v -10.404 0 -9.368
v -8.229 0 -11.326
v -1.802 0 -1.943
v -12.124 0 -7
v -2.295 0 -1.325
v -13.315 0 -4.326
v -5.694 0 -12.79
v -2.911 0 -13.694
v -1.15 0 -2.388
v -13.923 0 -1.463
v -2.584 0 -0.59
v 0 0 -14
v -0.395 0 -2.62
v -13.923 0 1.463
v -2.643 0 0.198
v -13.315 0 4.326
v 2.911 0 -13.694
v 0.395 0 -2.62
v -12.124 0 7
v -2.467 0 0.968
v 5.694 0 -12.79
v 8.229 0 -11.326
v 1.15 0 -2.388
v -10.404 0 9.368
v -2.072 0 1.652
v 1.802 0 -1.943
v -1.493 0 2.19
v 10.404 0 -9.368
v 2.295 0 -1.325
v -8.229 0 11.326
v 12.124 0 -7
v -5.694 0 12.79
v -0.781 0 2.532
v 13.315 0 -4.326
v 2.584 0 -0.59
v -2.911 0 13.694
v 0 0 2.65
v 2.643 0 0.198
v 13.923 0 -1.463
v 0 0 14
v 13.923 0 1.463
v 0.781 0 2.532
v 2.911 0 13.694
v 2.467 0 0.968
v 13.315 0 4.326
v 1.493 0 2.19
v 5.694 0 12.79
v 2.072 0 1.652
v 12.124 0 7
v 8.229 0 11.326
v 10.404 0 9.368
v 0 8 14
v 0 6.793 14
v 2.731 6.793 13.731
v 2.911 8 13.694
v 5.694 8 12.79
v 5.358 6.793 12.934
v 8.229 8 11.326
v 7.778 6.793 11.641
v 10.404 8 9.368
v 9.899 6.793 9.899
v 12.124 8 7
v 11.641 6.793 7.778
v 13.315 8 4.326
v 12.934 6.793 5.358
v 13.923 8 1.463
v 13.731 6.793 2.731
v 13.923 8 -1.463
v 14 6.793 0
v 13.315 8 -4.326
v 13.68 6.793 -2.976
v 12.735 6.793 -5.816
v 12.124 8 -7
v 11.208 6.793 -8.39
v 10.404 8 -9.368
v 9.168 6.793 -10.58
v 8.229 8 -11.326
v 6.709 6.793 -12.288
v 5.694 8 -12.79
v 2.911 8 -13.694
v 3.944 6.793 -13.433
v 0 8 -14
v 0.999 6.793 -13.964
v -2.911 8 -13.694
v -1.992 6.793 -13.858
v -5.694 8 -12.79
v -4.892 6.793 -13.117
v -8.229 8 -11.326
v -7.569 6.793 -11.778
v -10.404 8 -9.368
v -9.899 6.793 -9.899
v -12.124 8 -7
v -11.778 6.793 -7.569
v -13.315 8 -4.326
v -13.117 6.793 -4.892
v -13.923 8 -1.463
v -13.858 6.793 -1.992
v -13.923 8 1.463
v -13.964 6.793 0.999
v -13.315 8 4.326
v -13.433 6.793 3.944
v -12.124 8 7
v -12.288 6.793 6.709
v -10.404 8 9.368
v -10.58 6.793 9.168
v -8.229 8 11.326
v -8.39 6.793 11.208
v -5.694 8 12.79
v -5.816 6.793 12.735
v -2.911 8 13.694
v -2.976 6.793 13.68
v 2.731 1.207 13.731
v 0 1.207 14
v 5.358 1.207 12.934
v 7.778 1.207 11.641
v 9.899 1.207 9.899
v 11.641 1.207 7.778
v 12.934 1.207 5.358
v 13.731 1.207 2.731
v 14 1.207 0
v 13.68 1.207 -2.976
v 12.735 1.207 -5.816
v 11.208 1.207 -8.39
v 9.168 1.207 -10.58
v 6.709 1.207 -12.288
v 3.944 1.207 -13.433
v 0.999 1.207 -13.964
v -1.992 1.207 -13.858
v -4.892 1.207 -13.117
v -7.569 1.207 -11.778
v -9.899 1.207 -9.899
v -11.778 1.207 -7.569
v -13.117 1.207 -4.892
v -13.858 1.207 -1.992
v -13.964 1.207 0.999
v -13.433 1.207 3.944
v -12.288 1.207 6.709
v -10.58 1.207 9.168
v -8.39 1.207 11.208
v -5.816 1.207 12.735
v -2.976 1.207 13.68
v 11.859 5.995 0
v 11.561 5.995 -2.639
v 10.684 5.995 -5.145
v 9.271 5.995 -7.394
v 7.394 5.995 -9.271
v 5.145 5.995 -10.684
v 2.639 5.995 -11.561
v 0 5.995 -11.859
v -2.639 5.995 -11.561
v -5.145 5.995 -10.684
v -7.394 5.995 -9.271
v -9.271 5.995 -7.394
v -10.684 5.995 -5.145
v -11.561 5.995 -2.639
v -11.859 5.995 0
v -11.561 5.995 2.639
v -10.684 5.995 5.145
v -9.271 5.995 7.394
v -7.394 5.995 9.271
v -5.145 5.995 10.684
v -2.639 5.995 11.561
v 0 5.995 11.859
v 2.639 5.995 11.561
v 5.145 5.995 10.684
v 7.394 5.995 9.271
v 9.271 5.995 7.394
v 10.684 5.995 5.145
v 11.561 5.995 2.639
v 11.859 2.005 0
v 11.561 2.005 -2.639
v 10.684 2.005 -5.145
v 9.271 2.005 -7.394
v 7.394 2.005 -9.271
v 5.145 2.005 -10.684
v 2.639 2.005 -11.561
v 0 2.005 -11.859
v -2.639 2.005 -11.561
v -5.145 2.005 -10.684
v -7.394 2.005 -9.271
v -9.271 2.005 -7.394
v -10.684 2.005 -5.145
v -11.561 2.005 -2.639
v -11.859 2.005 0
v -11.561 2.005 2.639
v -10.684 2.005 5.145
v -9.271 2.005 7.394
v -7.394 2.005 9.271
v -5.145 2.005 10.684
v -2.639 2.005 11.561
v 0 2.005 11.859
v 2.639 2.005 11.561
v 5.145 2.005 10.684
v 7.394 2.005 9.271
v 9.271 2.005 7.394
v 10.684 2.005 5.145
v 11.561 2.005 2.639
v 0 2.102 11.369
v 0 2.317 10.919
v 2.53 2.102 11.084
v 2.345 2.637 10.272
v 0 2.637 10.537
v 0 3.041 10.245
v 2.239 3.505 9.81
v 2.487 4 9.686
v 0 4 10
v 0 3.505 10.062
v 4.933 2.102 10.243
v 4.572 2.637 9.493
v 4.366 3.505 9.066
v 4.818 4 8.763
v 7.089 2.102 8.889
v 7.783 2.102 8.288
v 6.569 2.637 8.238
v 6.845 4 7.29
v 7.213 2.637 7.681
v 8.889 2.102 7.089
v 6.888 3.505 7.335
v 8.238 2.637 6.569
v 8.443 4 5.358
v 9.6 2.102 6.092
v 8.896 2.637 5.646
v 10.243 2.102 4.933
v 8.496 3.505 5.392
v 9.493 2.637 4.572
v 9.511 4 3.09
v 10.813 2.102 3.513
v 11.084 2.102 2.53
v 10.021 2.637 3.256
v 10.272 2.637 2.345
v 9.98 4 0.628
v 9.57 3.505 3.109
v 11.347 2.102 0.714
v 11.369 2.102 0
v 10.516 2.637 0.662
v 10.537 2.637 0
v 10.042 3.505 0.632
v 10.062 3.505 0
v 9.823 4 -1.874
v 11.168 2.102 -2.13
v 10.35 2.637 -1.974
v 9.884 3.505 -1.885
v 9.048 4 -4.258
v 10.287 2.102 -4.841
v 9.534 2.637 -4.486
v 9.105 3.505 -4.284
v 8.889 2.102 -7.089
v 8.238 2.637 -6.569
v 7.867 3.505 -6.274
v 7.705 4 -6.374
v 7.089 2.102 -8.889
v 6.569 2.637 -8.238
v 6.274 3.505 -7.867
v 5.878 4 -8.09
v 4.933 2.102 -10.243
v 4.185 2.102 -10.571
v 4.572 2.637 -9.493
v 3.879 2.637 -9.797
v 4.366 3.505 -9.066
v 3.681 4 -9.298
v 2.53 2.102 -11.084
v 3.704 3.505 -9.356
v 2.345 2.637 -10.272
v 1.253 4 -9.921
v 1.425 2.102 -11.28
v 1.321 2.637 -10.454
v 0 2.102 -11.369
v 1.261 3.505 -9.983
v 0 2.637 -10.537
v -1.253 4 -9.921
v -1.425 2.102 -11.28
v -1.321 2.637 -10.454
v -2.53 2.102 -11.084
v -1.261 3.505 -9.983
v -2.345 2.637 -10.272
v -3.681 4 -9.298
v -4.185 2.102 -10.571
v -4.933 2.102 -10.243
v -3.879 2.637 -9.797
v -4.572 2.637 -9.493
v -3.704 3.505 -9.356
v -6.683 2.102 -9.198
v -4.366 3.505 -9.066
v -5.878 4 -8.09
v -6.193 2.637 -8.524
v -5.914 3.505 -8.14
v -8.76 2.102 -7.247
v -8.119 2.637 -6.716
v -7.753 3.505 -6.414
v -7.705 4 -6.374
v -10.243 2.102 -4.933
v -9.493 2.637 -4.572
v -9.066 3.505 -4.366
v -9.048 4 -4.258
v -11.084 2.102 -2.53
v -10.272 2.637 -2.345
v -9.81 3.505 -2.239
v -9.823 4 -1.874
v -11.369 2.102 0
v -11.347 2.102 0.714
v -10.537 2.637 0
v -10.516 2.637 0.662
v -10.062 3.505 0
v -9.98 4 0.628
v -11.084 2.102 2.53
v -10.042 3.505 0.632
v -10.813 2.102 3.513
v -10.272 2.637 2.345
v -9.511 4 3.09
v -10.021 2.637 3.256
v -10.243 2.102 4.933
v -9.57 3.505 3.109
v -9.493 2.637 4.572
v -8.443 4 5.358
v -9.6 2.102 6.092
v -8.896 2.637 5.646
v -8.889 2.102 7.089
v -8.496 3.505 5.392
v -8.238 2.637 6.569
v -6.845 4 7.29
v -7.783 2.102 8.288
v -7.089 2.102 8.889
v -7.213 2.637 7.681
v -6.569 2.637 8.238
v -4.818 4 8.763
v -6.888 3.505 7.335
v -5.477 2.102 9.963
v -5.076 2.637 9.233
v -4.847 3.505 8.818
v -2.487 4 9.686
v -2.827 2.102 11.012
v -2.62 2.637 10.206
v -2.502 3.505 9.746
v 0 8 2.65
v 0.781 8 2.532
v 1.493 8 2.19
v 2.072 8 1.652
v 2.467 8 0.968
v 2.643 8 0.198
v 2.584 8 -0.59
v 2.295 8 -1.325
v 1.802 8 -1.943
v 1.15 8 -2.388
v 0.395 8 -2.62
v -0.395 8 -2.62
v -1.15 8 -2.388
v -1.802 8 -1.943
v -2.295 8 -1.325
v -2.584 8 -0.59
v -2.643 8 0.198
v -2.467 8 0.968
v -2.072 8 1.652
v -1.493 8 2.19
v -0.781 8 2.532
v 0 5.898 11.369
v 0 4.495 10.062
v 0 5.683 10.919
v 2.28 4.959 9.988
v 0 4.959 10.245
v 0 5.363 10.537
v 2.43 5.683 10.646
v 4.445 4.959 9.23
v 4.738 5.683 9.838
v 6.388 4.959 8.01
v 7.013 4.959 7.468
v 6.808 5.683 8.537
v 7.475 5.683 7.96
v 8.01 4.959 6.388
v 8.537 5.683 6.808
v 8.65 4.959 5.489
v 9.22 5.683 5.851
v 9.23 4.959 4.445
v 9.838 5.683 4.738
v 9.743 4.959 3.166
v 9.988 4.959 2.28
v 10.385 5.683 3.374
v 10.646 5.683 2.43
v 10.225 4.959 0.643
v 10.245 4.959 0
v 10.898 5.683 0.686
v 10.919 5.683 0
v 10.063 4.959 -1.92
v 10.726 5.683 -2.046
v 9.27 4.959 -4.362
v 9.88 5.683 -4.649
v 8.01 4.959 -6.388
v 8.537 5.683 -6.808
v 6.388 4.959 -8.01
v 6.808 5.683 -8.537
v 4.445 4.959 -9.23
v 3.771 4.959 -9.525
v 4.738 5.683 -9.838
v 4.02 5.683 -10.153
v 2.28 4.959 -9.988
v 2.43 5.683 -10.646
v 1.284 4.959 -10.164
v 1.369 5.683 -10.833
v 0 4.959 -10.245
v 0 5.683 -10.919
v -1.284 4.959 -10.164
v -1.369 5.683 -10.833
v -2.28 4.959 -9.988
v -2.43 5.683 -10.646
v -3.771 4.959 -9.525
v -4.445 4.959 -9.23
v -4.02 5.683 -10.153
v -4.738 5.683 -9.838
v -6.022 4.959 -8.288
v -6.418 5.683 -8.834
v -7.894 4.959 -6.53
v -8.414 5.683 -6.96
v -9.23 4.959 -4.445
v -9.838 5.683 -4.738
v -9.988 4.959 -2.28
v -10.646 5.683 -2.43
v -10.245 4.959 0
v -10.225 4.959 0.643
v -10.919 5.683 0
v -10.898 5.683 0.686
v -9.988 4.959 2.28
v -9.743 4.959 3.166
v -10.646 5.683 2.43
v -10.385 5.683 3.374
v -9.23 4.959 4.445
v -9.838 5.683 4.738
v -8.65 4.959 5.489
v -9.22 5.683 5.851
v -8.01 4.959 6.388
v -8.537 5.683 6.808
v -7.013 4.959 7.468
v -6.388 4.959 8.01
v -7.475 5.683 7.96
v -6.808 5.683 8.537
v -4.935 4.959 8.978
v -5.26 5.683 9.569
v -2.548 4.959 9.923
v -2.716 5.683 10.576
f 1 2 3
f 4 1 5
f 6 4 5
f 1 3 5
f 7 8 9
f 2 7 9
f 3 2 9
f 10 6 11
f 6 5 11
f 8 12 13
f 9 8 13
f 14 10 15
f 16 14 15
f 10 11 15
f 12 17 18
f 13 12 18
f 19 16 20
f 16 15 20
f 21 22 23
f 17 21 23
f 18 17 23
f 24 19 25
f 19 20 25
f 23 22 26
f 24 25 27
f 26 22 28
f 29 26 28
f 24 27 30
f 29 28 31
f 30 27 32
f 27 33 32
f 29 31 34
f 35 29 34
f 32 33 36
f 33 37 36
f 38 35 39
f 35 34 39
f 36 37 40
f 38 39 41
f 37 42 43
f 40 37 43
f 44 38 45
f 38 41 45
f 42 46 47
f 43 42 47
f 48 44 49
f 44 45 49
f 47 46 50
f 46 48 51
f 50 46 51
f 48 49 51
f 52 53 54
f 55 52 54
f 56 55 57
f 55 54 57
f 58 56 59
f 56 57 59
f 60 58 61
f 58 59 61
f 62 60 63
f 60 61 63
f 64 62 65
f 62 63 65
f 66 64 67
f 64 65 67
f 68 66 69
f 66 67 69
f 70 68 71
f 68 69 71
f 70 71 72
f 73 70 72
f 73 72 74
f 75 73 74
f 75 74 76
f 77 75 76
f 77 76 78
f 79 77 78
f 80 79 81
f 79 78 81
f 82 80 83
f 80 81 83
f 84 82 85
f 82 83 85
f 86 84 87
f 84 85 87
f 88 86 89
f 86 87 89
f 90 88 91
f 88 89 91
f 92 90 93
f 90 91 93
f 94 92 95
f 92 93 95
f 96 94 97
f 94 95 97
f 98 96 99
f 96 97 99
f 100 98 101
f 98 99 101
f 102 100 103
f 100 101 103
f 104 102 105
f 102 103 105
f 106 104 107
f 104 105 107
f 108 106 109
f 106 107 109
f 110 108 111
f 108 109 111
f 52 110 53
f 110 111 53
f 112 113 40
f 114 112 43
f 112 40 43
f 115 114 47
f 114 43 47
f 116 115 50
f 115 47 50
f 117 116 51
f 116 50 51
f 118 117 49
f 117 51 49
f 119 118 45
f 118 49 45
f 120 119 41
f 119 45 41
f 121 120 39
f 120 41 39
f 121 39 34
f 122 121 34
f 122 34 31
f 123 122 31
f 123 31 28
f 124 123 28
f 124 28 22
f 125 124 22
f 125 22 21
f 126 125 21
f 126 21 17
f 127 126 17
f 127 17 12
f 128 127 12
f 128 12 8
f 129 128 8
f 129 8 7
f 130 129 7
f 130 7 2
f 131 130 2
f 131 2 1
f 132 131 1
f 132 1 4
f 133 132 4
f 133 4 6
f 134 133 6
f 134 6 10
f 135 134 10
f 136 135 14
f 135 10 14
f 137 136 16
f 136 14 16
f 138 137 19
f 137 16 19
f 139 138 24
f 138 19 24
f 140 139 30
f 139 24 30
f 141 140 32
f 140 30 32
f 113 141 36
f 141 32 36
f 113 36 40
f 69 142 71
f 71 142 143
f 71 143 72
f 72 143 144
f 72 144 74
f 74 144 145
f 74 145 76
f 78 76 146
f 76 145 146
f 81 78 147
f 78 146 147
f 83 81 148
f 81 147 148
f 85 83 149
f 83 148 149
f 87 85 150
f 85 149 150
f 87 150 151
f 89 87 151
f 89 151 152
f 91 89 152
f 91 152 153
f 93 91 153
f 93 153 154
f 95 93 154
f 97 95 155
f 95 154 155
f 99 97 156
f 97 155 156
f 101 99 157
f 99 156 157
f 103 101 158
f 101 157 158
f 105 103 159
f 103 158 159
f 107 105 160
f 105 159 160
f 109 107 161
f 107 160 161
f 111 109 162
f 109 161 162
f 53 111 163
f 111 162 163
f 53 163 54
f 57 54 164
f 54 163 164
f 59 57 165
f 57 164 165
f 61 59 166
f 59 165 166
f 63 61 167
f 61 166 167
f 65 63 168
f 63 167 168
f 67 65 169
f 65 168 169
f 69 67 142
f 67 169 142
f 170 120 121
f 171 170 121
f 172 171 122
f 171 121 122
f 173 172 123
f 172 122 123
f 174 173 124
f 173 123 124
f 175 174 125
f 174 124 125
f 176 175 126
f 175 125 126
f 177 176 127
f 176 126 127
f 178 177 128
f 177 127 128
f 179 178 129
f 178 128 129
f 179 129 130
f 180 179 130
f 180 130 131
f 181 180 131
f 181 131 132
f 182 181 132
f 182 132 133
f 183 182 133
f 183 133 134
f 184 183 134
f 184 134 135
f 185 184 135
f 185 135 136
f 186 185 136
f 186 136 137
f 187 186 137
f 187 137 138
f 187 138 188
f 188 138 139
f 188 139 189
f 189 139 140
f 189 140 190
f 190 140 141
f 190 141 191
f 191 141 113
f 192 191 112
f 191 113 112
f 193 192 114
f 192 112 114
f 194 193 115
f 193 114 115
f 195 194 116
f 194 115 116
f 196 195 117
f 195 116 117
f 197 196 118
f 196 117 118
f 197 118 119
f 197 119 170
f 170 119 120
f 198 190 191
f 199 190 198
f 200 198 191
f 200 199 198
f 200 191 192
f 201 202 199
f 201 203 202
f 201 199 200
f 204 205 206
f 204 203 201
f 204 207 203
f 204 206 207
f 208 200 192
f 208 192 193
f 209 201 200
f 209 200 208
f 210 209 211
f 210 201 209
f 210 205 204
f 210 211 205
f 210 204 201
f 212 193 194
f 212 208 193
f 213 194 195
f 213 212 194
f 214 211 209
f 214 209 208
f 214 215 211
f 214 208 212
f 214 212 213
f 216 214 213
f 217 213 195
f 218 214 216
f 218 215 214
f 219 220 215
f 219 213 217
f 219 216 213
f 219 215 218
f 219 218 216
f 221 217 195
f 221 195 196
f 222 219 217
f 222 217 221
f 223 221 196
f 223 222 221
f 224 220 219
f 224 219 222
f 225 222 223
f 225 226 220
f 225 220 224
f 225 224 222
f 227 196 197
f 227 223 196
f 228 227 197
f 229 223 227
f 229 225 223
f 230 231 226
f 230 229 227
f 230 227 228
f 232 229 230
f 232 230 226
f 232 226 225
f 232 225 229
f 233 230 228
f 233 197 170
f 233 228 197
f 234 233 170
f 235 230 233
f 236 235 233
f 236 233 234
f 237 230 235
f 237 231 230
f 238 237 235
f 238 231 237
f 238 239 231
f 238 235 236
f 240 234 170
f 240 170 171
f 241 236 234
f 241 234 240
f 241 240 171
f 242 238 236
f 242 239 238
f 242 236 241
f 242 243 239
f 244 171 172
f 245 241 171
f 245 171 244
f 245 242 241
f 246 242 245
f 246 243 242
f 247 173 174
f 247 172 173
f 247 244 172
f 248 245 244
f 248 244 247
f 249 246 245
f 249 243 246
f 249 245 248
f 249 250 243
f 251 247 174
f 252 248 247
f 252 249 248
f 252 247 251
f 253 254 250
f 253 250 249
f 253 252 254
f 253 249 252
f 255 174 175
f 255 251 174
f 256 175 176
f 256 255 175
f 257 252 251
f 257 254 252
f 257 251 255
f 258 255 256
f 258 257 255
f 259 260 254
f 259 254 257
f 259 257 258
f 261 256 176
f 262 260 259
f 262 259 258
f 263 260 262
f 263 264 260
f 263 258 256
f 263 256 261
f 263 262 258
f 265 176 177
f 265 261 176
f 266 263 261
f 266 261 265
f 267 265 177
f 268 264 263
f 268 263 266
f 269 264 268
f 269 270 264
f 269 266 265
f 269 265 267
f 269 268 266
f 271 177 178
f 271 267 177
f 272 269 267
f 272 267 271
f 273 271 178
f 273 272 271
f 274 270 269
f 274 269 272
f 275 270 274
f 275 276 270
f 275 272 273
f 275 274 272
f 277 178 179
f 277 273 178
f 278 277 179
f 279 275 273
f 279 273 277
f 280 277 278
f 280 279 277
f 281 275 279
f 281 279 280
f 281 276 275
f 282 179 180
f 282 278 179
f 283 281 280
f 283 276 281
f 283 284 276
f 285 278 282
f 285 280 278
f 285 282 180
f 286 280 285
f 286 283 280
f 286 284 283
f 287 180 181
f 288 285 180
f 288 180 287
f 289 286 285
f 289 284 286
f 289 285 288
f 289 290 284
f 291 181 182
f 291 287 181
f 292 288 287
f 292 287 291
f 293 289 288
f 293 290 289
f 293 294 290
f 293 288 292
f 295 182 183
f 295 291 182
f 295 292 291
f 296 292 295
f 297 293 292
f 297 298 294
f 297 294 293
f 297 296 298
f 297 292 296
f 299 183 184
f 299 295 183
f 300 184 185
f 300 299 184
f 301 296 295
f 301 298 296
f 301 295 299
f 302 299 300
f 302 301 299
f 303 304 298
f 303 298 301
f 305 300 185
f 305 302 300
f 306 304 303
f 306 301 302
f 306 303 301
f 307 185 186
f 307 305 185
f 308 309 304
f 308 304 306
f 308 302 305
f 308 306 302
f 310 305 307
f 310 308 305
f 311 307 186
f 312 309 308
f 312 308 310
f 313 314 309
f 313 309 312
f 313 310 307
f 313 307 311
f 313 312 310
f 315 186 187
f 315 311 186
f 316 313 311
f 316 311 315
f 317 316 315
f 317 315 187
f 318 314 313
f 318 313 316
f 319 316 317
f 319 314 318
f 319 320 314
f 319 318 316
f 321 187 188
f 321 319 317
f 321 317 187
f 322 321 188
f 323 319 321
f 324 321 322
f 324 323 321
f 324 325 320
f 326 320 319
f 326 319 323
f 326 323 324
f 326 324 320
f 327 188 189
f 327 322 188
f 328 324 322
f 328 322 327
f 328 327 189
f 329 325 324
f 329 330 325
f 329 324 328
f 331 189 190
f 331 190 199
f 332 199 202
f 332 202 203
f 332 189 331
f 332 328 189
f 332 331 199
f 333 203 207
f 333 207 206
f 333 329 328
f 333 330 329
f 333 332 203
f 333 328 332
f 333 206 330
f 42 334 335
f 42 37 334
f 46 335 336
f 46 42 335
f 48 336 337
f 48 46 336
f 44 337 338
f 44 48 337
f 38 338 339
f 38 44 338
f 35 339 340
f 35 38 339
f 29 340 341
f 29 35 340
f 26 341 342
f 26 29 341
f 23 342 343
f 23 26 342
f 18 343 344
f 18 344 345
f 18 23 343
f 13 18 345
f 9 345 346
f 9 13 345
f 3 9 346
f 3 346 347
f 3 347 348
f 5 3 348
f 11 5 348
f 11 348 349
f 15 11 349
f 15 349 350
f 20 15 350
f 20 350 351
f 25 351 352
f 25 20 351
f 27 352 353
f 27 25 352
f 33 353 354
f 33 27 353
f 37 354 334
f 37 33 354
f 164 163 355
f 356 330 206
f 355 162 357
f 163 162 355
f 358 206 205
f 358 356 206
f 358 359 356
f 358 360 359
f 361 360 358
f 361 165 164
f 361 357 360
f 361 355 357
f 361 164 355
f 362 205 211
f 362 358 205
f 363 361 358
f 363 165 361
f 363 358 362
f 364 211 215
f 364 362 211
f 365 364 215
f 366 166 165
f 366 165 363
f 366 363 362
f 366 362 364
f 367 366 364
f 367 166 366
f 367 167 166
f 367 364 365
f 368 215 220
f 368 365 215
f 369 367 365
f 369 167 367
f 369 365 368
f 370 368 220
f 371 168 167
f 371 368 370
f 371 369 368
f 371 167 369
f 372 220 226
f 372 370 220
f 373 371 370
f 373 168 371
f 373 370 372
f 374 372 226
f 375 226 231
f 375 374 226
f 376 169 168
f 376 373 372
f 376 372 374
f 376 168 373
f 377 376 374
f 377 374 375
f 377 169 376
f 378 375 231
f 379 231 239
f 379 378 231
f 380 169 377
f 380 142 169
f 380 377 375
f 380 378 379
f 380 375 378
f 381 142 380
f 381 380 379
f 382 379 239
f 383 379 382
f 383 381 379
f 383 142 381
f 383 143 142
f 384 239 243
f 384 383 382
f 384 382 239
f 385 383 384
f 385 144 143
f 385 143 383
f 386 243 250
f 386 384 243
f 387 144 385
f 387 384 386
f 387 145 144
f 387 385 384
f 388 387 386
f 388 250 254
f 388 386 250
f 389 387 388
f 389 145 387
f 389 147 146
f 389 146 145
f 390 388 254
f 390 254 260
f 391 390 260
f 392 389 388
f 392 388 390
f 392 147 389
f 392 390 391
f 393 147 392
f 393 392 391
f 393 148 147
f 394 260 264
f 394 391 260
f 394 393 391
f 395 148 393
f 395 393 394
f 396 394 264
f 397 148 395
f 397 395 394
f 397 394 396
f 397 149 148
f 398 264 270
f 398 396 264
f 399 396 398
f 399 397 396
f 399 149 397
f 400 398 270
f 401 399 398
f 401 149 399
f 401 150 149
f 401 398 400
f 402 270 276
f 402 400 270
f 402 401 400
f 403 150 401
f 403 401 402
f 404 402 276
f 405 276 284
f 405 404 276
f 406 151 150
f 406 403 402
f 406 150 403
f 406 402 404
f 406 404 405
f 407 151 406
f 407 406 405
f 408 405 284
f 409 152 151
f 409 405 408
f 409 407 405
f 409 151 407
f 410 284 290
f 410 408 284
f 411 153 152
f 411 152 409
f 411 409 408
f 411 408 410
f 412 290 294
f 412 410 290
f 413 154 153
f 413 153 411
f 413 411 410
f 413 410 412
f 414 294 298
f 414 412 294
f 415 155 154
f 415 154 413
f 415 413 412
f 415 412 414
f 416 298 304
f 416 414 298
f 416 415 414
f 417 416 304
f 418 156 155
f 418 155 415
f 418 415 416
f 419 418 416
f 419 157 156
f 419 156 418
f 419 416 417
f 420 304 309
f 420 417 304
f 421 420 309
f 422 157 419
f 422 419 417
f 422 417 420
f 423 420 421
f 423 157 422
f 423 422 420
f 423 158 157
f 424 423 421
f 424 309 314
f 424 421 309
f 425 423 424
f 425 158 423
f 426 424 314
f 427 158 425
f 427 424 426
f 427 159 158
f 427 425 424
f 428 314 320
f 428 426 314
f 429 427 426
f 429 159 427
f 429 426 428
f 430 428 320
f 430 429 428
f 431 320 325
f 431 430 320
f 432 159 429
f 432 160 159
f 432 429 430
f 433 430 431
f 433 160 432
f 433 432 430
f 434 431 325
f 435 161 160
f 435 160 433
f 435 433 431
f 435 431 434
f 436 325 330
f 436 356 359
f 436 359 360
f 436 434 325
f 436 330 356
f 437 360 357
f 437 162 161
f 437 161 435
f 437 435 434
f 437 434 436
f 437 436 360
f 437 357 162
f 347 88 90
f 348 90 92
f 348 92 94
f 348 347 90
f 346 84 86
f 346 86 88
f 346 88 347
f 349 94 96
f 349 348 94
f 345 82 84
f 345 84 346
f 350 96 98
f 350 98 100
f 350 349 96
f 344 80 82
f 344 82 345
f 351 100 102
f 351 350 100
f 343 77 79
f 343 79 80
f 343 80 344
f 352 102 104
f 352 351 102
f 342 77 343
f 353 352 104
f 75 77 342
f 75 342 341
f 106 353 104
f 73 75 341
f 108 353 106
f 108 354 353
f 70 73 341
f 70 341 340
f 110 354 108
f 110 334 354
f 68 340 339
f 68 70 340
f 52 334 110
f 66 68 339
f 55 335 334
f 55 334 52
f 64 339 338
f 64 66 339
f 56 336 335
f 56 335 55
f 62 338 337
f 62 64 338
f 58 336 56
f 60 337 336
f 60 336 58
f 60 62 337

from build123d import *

# Parameters (mm, degrees)
SKETCH1_R           = 14
SKETCH1_R_2         = 2.65
BOSS_EXTRUDE1_DEPTH = 6
CUT_EXTRUDE1_START  = -4
SKETCH2_R           = 14
SKETCH2_R_2         = 10
CUT_EXTRUDE1_DEPTH  = 4
SKETCH3_R           = 14
SKETCH3_R_2         = 2.65
BOSS_EXTRUDE2_DEPTH = 2
FILLET1_R           = 2


with BuildPart() as part:
    # Sketch1 → Boss-Extrude1 (new body)
    with BuildSketch(Plane(origin=(0, 0, 0), x_dir=(1, 0, 0), z_dir=(0, 1, 0))):
        with Locations(Location((0, 0, 0), (0, 0, 270))):
            Circle(SKETCH1_R)
        with Locations(Location((0, 0, 0), (0, 0, 270))):
            Circle(SKETCH1_R_2, mode=Mode.SUBTRACT)
    extrude(amount=BOSS_EXTRUDE1_DEPTH)

    # Sketch2 → Cut-Extrude1 (cut)
    with BuildSketch(Plane(origin=(0, 6, 0), x_dir=(1, 0, 0), z_dir=(0, 1, 0)).offset(CUT_EXTRUDE1_START)):
        with Locations(Location((0, 0, 0), (0, 0, 270))):
            Circle(SKETCH2_R)
        with Locations(Location((0, 0, 0), (0, 0, 270))):
            Circle(SKETCH2_R_2, mode=Mode.SUBTRACT)
    extrude(amount=CUT_EXTRUDE1_DEPTH, mode=Mode.SUBTRACT)

    # Sketch3 → Boss-Extrude2 (add)
    with BuildSketch(Plane(origin=(0, 6, 0), x_dir=(1, 0, 0), z_dir=(0, 1, 0))):
        with Locations(Location((0, 0, 0), (0, 0, 270))):
            Circle(SKETCH3_R)
        with Locations(Location((0, 0, 0), (0, 0, 270))):
            Circle(SKETCH3_R_2, mode=Mode.SUBTRACT)
    extrude(amount=BOSS_EXTRUDE2_DEPTH)

    # Fillet1
    fillet1_edges = [part.edges().sort_by_distance(p)[0] for p in [
        (0, 2, -10),
        (0, 6, -10),
    ]]
    fillet(fillet1_edges, radius=FILLET1_R - 0.0001)  # a hair under: the kernel refuses the full size

    # Chamfer1: read off the stored shape, not the designer's step
    # Chamfer1 outline → Chamfer1 (revolve, cut)
    with BuildSketch(Plane.XY):
        Polygon((11.858584332, 5.994994138), (12, 5.994994138), (12, 6), (14, 6), (14, 6.792991793), align=None)
        Polygon((12, 2.005005862), (11.858584332, 2.005005862), (14, 1.207008207), (14, 2), (12, 2), align=None)
    revolve(axis=Axis((0, 0, 0), (0, 1, 0)), mode=Mode.SUBTRACT)


solid = part.part
